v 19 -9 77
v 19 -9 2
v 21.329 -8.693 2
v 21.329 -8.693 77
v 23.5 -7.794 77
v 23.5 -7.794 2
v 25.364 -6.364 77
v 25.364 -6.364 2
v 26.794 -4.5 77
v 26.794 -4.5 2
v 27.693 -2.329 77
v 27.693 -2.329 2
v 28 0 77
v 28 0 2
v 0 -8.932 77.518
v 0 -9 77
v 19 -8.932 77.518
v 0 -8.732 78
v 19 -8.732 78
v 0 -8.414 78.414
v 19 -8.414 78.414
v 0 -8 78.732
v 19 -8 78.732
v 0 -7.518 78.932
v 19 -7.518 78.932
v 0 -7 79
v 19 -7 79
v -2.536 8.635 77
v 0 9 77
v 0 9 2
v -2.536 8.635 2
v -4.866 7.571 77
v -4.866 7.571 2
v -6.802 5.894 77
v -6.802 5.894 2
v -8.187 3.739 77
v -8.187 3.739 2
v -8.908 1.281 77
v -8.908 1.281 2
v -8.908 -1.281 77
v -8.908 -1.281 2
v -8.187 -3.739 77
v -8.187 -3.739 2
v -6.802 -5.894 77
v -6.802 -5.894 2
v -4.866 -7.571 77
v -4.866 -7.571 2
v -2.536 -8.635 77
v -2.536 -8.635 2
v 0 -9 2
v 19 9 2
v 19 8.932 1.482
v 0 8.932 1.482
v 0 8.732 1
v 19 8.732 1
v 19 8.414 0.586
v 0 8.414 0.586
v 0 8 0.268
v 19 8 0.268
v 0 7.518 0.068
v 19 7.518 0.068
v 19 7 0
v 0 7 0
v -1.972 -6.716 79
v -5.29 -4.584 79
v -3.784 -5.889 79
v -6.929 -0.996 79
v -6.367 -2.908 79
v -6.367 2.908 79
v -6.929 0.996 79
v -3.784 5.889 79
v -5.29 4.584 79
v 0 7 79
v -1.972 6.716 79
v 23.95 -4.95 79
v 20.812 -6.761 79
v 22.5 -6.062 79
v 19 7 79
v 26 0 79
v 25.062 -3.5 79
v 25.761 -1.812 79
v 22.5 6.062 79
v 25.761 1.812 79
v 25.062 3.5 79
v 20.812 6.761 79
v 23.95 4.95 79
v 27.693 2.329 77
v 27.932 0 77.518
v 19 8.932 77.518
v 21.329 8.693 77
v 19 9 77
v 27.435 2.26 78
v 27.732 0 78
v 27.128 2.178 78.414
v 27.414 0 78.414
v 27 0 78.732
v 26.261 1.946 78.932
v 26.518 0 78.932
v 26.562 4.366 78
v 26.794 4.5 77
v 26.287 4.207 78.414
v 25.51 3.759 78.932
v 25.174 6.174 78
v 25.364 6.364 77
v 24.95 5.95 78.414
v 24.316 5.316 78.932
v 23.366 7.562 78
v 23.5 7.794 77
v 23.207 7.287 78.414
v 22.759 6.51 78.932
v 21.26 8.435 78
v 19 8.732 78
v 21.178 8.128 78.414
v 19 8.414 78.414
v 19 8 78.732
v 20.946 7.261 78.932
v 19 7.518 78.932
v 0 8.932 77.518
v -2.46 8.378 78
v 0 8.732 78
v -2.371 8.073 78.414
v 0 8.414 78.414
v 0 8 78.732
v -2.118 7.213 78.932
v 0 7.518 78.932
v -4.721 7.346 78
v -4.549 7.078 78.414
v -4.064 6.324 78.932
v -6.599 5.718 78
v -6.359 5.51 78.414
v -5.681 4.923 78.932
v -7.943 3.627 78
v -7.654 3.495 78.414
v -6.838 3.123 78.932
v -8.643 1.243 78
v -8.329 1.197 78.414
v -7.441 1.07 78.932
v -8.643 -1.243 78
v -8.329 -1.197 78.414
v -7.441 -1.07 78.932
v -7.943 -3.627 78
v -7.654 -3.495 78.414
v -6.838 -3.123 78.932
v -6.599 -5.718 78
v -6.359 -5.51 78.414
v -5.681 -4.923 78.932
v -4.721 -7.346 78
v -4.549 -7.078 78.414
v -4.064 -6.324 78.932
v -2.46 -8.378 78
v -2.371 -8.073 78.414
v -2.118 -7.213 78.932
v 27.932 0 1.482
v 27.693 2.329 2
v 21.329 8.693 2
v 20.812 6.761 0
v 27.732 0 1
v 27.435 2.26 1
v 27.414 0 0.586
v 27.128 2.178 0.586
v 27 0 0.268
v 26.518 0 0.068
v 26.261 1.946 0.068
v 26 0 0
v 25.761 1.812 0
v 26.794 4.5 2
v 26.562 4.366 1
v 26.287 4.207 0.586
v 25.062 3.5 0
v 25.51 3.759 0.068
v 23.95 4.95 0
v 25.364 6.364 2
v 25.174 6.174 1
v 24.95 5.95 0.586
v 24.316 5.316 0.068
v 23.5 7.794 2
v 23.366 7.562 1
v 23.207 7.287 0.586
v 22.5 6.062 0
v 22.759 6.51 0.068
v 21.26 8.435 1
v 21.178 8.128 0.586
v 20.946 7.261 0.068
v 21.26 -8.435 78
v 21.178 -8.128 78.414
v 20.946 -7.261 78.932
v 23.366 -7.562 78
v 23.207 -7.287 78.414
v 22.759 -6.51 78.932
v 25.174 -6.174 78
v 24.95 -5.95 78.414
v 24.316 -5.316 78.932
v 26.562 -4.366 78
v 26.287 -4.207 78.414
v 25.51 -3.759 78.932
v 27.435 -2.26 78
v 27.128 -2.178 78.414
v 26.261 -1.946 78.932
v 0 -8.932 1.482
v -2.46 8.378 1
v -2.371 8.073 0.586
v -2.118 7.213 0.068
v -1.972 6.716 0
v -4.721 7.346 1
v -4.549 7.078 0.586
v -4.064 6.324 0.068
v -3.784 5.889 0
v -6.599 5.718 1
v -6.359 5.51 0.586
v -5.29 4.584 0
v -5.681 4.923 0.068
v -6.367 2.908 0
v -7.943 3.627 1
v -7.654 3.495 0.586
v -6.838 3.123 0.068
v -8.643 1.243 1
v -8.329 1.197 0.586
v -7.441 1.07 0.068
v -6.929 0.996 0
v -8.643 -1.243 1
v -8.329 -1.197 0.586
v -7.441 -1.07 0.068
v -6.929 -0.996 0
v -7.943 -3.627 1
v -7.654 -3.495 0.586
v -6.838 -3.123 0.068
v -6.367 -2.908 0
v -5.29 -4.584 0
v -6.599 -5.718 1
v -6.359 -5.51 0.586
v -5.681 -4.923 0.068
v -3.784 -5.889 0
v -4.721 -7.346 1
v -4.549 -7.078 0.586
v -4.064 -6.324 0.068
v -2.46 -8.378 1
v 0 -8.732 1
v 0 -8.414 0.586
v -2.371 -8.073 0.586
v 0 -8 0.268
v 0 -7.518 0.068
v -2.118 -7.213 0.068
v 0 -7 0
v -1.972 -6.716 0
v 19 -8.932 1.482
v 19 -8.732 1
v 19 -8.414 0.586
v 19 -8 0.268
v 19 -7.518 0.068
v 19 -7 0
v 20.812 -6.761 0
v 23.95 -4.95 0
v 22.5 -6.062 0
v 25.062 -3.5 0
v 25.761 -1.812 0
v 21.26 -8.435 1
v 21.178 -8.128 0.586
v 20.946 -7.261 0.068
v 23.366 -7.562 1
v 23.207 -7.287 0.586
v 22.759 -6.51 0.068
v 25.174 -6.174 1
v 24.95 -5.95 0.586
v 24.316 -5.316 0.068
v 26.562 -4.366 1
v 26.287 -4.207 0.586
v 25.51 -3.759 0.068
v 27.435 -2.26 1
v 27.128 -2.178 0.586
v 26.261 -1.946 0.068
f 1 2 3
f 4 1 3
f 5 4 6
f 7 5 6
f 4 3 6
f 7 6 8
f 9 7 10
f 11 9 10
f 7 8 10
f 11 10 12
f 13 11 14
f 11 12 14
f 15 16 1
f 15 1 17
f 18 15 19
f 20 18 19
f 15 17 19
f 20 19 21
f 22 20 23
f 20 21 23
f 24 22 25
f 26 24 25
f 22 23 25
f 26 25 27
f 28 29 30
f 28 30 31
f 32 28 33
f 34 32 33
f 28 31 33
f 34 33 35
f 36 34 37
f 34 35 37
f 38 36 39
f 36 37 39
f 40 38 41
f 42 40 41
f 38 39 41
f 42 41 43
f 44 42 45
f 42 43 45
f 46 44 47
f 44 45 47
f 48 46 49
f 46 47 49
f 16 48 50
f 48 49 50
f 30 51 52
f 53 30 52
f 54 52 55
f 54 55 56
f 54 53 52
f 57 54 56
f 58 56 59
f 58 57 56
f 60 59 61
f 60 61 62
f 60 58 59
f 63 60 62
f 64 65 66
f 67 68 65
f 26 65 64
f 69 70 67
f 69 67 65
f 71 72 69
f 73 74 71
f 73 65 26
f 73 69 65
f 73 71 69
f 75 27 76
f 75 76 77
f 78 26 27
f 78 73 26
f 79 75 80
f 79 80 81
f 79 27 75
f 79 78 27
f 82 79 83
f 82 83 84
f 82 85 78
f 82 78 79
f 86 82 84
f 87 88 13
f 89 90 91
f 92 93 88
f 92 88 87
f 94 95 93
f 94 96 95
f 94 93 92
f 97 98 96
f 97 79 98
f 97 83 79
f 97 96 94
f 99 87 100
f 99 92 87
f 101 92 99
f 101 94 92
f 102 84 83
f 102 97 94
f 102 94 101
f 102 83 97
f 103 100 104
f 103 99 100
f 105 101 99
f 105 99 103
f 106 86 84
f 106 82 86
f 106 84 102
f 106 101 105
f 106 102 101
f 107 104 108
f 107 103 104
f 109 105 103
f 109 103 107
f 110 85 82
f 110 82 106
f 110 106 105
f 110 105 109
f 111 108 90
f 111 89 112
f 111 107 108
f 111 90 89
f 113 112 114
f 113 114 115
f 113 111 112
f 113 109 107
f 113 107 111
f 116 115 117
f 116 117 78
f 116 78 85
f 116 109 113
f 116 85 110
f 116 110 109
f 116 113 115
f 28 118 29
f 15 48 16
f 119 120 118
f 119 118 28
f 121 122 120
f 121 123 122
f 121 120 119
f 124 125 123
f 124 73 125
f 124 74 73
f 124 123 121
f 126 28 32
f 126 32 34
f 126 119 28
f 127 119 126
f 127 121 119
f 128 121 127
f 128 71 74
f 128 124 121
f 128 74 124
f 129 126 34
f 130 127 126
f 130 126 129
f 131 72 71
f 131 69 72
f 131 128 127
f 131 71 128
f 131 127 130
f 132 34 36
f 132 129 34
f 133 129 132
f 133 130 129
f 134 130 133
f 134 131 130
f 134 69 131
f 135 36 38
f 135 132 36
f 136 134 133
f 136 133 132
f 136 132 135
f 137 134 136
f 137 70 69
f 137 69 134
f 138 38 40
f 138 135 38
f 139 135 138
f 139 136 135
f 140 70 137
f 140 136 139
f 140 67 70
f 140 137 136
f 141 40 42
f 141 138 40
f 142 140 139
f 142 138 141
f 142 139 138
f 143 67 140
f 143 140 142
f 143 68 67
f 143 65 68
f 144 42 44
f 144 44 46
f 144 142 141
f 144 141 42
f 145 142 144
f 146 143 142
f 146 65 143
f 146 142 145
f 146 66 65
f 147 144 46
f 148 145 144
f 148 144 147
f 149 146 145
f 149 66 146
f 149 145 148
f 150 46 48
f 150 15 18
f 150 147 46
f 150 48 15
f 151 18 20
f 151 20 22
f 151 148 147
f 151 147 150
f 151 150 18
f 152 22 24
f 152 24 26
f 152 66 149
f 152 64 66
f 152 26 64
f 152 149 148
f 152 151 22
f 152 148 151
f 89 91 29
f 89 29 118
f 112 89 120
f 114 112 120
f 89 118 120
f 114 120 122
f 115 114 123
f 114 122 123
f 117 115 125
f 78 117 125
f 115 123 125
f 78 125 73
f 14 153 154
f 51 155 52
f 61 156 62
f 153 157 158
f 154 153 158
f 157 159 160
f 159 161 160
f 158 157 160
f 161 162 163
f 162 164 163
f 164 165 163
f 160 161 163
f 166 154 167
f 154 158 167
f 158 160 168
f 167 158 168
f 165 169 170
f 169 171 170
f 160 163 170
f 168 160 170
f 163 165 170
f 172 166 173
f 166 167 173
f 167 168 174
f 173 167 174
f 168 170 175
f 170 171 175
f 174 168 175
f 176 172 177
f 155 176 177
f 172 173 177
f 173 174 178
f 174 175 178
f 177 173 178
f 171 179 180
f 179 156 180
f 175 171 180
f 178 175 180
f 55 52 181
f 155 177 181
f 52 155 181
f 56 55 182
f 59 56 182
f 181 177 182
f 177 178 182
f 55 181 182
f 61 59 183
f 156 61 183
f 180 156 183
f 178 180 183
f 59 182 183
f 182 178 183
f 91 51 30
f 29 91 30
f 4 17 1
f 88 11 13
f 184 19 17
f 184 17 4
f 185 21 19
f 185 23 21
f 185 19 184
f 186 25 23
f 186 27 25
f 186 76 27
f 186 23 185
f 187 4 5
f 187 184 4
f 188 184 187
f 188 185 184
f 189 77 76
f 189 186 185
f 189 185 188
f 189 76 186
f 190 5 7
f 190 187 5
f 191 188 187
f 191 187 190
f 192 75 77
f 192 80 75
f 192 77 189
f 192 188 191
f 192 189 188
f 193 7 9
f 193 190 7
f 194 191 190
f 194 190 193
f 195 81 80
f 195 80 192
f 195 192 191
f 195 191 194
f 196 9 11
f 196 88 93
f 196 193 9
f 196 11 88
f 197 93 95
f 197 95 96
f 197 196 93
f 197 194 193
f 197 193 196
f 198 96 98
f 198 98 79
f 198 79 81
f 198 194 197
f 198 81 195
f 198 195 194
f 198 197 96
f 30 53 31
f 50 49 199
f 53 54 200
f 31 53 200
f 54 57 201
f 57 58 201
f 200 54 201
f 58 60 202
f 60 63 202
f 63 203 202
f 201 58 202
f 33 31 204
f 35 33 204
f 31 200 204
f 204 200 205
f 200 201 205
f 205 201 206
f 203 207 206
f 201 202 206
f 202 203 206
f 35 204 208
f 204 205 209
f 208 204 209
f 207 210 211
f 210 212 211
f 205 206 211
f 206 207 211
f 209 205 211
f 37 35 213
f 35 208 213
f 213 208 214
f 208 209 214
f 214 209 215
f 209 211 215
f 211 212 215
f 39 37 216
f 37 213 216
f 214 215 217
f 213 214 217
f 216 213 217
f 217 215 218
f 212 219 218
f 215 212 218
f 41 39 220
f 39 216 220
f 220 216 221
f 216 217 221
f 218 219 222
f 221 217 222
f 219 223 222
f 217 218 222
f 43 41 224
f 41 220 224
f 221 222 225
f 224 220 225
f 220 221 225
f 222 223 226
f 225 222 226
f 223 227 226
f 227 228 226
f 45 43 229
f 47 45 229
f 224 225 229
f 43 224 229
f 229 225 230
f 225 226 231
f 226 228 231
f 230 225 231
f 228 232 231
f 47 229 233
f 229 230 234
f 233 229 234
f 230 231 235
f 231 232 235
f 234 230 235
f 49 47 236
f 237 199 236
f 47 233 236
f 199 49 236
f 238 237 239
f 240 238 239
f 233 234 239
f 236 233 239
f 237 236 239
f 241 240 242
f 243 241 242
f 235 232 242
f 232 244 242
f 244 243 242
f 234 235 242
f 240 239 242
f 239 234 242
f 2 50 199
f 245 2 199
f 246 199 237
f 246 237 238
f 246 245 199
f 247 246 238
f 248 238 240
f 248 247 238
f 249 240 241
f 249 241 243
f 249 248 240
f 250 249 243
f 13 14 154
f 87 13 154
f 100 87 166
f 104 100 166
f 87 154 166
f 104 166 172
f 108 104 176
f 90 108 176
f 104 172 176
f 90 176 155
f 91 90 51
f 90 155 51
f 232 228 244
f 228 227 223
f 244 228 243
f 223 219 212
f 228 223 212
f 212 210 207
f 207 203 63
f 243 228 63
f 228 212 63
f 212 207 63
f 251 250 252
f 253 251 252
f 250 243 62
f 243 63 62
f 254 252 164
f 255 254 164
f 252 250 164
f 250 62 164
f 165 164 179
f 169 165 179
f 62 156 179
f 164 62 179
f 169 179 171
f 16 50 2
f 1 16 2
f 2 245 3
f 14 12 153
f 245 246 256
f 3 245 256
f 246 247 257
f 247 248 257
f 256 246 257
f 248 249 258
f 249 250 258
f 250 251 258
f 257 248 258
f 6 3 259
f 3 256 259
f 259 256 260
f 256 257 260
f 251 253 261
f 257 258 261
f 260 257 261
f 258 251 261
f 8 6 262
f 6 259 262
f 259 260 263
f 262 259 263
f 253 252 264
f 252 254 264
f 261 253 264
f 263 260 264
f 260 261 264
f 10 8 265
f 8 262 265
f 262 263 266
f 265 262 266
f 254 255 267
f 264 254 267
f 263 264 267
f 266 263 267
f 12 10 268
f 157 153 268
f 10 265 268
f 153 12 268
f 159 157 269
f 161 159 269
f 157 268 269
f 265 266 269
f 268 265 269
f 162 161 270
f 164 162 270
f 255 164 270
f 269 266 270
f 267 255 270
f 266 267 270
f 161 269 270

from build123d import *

# Parameters (mm, degrees)
BOSS_EXTRUDE1_DEPTH = 79
FILLET1_R           = 2


with BuildPart() as part:
    # Sketch1 → Boss-Extrude1 (new body)
    with BuildSketch(Plane.XY):
        with BuildLine():
            Line((0, 0), (0, 9))
            ThreePointArc((0, 9), (-9, 0), (0, -9))
            Line((0, -9), (0, 0))
        make_face()
        with BuildLine():
            ThreePointArc((9, 0), (6.363961031, 6.363961031), (0, 9))
            Line((0, 9), (0, 0))
            Line((0, 0), (9, 0))
        make_face()
        with BuildLine():
            Line((19, 9), (0, 9))
            ThreePointArc((0, 9), (6.363961031, 6.363961031), (9, 0))
            Line((9, 0), (10, 0))
            ThreePointArc((10, 0), (12.636038969, 6.363961031), (19, 9))
        make_face()
        with BuildLine():
            Line((19, 0), (19, 9))
            ThreePointArc((19, 9), (12.636038969, 6.363961031), (10, 0))
            Line((10, 0), (19, 0))
        make_face()
        with BuildLine():
            ThreePointArc((28, 0), (25.363961031, 6.363961031), (19, 9))
            Line((19, 9), (19, 0))
            Line((19, 0), (19, -9))
            ThreePointArc((19, -9), (25.363961031, -6.363961031), (28, 0))
        make_face()
        with BuildLine():
            Line((19, -9), (19, 0))
            Line((19, 0), (10, 0))
            ThreePointArc((10, 0), (12.636038969, -6.363961031), (19, -9))
        make_face()
        with BuildLine():
            Line((10, 0), (9, 0))
            ThreePointArc((9, 0), (6.363961031, -6.363961031), (0, -9))
            Line((0, -9), (19, -9))
            ThreePointArc((19, -9), (12.636038969, -6.363961031), (10, 0))
        make_face()
        with BuildLine():
            Line((9, 0), (0, 0))
            Line((0, 0), (0, -9))
            ThreePointArc((0, -9), (6.363961031, -6.363961031), (9, 0))
        make_face()
    extrude(amount=BOSS_EXTRUDE1_DEPTH)

    # Fillet1
    fillet1_edges = [part.edges().sort_by_distance(p)[0] for p in [
        (9.5, 9, 79),
        (-9, 0, 79),
        (9.5, -9, 79),
        (-9, 0, 0),
        (9.5, 9, 0),
        (28, 0, 0),
        (9.5, -9, 0),
        (28, 0, 79),
    ]]
    fillet(fillet1_edges, radius=FILLET1_R)


solid = part.part
